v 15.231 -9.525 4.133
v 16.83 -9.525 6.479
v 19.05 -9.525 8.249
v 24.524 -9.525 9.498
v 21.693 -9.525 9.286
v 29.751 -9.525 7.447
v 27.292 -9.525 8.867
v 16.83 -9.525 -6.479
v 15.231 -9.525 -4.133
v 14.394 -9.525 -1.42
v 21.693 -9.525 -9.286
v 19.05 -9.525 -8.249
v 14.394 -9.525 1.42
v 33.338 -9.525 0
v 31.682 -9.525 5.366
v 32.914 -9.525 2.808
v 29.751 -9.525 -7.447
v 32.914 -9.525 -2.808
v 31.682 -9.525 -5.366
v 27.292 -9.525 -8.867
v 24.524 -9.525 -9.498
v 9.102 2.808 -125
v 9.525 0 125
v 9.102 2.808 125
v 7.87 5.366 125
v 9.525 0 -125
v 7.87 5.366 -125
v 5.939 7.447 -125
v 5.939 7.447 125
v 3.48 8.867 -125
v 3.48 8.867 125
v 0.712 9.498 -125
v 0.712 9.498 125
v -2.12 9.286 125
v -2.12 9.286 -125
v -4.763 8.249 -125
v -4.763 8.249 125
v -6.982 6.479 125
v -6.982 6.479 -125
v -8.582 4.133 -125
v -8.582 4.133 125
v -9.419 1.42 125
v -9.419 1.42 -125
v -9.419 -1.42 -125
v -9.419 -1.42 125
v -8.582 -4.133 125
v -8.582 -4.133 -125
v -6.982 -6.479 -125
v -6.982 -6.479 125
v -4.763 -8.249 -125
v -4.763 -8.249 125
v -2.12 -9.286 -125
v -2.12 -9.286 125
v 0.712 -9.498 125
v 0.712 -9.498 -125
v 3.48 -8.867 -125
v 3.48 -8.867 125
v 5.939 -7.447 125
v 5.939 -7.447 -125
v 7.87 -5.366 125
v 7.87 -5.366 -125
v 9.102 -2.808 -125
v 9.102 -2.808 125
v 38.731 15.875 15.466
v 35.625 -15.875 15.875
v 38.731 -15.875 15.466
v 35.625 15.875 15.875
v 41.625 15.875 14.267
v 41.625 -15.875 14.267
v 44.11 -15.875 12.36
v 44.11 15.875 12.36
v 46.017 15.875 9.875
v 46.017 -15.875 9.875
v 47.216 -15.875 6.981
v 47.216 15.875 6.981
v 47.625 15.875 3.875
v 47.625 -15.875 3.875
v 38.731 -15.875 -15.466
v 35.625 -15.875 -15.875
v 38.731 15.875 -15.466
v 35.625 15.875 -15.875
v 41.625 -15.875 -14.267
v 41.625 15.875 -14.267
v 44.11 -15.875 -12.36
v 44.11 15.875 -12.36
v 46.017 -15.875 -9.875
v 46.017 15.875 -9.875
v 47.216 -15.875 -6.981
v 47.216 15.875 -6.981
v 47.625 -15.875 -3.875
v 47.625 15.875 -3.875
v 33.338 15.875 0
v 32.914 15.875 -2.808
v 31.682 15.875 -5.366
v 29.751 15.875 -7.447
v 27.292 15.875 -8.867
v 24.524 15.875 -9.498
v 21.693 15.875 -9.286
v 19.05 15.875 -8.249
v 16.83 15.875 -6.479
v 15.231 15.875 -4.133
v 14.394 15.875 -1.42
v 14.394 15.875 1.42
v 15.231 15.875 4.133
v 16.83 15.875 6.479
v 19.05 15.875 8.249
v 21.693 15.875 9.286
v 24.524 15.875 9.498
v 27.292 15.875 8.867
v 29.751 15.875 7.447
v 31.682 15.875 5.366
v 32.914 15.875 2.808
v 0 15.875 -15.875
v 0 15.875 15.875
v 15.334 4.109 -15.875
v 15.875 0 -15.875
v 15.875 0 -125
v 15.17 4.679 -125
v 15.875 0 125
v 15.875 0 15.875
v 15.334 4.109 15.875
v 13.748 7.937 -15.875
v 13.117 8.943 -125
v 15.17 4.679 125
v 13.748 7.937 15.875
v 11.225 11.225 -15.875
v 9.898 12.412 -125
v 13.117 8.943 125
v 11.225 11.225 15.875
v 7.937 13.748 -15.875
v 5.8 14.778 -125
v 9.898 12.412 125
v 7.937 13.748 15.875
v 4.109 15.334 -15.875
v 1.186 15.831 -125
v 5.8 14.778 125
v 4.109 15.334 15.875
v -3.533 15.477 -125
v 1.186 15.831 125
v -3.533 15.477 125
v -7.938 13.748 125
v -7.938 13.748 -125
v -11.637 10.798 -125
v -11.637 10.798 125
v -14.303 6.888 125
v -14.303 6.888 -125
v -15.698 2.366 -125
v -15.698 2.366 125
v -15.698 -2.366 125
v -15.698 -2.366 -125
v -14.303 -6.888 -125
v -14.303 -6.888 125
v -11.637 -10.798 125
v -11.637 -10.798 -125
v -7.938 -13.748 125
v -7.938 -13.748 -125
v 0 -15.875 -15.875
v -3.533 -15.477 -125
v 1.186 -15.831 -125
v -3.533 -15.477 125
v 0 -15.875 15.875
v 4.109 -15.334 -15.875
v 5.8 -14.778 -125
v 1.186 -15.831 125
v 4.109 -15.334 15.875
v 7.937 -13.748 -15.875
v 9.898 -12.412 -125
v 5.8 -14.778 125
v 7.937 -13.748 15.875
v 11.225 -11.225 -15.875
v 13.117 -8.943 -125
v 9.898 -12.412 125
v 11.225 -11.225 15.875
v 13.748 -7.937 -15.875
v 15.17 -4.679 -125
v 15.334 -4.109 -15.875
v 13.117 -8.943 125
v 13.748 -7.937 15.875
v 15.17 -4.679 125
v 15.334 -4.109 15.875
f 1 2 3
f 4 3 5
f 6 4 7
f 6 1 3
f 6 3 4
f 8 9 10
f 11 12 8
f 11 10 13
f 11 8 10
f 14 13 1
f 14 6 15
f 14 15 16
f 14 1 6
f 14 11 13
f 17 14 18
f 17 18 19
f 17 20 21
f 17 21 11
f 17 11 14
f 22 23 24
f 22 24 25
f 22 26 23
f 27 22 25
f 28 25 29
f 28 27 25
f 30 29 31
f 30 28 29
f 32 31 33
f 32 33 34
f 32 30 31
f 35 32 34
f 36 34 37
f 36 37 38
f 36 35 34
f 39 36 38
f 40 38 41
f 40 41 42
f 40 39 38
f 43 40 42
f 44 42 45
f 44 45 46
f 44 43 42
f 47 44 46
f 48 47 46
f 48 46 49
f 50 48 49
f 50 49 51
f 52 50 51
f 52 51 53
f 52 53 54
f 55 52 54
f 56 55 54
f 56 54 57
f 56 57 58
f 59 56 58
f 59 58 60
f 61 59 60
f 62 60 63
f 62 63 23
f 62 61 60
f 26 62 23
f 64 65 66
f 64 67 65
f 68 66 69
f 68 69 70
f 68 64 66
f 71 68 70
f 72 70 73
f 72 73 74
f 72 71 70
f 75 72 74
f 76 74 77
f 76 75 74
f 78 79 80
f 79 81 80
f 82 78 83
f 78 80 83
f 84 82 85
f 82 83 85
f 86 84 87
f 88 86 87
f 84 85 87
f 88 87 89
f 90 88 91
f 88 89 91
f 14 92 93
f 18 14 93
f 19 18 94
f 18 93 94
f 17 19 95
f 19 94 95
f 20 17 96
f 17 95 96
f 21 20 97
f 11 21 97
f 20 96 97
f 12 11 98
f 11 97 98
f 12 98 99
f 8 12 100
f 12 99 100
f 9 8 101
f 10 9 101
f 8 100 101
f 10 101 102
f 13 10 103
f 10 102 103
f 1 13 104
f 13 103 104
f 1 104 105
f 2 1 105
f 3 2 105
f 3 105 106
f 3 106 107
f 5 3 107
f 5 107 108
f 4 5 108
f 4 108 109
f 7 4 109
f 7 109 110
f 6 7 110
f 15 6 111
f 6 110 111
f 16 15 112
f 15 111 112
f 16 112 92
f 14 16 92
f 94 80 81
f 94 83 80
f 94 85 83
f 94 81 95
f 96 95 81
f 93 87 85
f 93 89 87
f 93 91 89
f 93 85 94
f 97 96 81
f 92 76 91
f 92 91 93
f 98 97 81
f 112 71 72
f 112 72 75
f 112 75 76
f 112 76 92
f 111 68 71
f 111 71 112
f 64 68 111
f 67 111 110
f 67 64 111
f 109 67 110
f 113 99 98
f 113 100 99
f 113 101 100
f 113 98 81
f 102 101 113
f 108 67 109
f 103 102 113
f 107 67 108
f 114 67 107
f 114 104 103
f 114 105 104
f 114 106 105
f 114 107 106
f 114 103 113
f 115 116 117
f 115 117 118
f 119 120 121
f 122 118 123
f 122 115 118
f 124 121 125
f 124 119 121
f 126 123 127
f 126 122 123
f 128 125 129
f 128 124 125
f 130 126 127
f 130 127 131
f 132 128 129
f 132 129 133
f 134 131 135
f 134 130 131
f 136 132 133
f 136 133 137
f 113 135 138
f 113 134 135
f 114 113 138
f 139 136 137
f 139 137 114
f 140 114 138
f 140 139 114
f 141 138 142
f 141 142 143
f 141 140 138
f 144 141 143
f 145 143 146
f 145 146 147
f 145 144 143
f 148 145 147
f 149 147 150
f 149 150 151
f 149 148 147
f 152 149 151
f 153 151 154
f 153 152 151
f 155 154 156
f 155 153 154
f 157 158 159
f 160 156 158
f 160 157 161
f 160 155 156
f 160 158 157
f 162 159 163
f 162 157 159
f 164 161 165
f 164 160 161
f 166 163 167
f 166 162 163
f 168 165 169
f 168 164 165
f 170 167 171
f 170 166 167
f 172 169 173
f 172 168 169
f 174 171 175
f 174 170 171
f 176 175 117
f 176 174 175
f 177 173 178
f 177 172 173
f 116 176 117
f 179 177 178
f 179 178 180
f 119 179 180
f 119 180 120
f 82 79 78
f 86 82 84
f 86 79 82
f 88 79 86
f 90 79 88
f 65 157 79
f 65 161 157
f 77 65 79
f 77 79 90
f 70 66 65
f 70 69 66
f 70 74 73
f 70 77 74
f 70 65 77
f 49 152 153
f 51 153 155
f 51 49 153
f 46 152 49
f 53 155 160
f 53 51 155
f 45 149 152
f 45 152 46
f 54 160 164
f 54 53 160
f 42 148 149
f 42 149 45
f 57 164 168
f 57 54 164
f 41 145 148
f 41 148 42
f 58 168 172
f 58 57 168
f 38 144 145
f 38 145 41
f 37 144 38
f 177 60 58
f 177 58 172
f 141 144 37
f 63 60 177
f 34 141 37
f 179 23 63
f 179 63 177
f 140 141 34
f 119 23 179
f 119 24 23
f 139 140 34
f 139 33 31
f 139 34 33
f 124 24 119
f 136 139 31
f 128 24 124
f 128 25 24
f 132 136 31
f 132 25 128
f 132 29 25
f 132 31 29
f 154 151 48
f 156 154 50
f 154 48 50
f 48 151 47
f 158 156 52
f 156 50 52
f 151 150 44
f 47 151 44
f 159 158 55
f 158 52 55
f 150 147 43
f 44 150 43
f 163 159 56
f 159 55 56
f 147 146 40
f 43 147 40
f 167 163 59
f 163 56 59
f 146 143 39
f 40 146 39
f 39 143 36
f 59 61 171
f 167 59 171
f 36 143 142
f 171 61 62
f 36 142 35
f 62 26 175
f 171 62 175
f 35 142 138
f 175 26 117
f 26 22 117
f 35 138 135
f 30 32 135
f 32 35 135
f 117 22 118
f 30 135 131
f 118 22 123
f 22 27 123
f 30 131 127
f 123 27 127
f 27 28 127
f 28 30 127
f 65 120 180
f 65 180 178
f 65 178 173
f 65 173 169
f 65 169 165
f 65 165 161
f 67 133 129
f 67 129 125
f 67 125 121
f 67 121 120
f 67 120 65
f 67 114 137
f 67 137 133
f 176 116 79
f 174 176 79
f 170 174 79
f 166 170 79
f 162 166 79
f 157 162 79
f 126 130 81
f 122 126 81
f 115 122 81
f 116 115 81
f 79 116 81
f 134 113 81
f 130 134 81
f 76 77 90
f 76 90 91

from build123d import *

# Parameters (mm, degrees)
SKETCH1_R           = 9.525
BOSS_EXTRUDE1_DEPTH = 125
BOSS_EXTRUDE2_DEPTH = 15.875
SKETCH2_R           = 9.525
CUT_EXTRUDE1_DEPTH  = 25.4
FILLET1_R           = 12


with BuildPart() as part:
    # Sketch1 → Boss-Extrude1 (new, symmetric)
    with BuildSketch(Plane.XY):
        with BuildLine():
            ThreePointArc((9.7e-16, 15.875), (-15.875, 1.94e-15), (-2.92e-15, -15.875))
            ThreePointArc((-2.92e-15, -15.875), (11.225320151336438, -11.225320151336444), (15.875, -3.89e-15))
            ThreePointArc((15.875, 0), (11.225320151336442, 11.22532015133644), (9.7e-16, 15.875))
        make_face()
        Circle(SKETCH1_R, mode=Mode.SUBTRACT)
    extrude(amount=BOSS_EXTRUDE1_DEPTH, both=True)

    # Sketch1<3> → Boss-Extrude2 (add, symmetric)
    with BuildSketch(Plane.XY):
        with BuildLine():
            ThreePointArc((0, 15.875), (15.875, 9.7e-16), (1.94e-15, -15.875))
            Line((0, -15.875), (47.625, -15.874999999999996))
            Line((47.625, -15.874999999999996), (47.62499999999999, 15.874999999999996))
            Line((47.62499999999999, 15.874999999999996), (0, 15.875))
        make_face()
    extrude(amount=BOSS_EXTRUDE2_DEPTH, both=True)

    # Sketch2 → Cut-Extrude1 (cut)
    with BuildSketch(Plane(origin=(1.16e-15, 15.875, 0), x_dir=(1, -7e-17, 0), z_dir=(7e-17, 1, 0))):
        with Locations((23.8125, 0)):
            Circle(SKETCH2_R)
    extrude(amount=-CUT_EXTRUDE1_DEPTH, mode=Mode.SUBTRACT)

    # Fillet1
    fillet1_edges = [part.edges().sort_by_distance(p)[0] for p in [
        (47.625, 0, -15.875),
        (47.625, 0, 15.875),
    ]]
    fillet(fillet1_edges, radius=FILLET1_R)


solid = part.part
